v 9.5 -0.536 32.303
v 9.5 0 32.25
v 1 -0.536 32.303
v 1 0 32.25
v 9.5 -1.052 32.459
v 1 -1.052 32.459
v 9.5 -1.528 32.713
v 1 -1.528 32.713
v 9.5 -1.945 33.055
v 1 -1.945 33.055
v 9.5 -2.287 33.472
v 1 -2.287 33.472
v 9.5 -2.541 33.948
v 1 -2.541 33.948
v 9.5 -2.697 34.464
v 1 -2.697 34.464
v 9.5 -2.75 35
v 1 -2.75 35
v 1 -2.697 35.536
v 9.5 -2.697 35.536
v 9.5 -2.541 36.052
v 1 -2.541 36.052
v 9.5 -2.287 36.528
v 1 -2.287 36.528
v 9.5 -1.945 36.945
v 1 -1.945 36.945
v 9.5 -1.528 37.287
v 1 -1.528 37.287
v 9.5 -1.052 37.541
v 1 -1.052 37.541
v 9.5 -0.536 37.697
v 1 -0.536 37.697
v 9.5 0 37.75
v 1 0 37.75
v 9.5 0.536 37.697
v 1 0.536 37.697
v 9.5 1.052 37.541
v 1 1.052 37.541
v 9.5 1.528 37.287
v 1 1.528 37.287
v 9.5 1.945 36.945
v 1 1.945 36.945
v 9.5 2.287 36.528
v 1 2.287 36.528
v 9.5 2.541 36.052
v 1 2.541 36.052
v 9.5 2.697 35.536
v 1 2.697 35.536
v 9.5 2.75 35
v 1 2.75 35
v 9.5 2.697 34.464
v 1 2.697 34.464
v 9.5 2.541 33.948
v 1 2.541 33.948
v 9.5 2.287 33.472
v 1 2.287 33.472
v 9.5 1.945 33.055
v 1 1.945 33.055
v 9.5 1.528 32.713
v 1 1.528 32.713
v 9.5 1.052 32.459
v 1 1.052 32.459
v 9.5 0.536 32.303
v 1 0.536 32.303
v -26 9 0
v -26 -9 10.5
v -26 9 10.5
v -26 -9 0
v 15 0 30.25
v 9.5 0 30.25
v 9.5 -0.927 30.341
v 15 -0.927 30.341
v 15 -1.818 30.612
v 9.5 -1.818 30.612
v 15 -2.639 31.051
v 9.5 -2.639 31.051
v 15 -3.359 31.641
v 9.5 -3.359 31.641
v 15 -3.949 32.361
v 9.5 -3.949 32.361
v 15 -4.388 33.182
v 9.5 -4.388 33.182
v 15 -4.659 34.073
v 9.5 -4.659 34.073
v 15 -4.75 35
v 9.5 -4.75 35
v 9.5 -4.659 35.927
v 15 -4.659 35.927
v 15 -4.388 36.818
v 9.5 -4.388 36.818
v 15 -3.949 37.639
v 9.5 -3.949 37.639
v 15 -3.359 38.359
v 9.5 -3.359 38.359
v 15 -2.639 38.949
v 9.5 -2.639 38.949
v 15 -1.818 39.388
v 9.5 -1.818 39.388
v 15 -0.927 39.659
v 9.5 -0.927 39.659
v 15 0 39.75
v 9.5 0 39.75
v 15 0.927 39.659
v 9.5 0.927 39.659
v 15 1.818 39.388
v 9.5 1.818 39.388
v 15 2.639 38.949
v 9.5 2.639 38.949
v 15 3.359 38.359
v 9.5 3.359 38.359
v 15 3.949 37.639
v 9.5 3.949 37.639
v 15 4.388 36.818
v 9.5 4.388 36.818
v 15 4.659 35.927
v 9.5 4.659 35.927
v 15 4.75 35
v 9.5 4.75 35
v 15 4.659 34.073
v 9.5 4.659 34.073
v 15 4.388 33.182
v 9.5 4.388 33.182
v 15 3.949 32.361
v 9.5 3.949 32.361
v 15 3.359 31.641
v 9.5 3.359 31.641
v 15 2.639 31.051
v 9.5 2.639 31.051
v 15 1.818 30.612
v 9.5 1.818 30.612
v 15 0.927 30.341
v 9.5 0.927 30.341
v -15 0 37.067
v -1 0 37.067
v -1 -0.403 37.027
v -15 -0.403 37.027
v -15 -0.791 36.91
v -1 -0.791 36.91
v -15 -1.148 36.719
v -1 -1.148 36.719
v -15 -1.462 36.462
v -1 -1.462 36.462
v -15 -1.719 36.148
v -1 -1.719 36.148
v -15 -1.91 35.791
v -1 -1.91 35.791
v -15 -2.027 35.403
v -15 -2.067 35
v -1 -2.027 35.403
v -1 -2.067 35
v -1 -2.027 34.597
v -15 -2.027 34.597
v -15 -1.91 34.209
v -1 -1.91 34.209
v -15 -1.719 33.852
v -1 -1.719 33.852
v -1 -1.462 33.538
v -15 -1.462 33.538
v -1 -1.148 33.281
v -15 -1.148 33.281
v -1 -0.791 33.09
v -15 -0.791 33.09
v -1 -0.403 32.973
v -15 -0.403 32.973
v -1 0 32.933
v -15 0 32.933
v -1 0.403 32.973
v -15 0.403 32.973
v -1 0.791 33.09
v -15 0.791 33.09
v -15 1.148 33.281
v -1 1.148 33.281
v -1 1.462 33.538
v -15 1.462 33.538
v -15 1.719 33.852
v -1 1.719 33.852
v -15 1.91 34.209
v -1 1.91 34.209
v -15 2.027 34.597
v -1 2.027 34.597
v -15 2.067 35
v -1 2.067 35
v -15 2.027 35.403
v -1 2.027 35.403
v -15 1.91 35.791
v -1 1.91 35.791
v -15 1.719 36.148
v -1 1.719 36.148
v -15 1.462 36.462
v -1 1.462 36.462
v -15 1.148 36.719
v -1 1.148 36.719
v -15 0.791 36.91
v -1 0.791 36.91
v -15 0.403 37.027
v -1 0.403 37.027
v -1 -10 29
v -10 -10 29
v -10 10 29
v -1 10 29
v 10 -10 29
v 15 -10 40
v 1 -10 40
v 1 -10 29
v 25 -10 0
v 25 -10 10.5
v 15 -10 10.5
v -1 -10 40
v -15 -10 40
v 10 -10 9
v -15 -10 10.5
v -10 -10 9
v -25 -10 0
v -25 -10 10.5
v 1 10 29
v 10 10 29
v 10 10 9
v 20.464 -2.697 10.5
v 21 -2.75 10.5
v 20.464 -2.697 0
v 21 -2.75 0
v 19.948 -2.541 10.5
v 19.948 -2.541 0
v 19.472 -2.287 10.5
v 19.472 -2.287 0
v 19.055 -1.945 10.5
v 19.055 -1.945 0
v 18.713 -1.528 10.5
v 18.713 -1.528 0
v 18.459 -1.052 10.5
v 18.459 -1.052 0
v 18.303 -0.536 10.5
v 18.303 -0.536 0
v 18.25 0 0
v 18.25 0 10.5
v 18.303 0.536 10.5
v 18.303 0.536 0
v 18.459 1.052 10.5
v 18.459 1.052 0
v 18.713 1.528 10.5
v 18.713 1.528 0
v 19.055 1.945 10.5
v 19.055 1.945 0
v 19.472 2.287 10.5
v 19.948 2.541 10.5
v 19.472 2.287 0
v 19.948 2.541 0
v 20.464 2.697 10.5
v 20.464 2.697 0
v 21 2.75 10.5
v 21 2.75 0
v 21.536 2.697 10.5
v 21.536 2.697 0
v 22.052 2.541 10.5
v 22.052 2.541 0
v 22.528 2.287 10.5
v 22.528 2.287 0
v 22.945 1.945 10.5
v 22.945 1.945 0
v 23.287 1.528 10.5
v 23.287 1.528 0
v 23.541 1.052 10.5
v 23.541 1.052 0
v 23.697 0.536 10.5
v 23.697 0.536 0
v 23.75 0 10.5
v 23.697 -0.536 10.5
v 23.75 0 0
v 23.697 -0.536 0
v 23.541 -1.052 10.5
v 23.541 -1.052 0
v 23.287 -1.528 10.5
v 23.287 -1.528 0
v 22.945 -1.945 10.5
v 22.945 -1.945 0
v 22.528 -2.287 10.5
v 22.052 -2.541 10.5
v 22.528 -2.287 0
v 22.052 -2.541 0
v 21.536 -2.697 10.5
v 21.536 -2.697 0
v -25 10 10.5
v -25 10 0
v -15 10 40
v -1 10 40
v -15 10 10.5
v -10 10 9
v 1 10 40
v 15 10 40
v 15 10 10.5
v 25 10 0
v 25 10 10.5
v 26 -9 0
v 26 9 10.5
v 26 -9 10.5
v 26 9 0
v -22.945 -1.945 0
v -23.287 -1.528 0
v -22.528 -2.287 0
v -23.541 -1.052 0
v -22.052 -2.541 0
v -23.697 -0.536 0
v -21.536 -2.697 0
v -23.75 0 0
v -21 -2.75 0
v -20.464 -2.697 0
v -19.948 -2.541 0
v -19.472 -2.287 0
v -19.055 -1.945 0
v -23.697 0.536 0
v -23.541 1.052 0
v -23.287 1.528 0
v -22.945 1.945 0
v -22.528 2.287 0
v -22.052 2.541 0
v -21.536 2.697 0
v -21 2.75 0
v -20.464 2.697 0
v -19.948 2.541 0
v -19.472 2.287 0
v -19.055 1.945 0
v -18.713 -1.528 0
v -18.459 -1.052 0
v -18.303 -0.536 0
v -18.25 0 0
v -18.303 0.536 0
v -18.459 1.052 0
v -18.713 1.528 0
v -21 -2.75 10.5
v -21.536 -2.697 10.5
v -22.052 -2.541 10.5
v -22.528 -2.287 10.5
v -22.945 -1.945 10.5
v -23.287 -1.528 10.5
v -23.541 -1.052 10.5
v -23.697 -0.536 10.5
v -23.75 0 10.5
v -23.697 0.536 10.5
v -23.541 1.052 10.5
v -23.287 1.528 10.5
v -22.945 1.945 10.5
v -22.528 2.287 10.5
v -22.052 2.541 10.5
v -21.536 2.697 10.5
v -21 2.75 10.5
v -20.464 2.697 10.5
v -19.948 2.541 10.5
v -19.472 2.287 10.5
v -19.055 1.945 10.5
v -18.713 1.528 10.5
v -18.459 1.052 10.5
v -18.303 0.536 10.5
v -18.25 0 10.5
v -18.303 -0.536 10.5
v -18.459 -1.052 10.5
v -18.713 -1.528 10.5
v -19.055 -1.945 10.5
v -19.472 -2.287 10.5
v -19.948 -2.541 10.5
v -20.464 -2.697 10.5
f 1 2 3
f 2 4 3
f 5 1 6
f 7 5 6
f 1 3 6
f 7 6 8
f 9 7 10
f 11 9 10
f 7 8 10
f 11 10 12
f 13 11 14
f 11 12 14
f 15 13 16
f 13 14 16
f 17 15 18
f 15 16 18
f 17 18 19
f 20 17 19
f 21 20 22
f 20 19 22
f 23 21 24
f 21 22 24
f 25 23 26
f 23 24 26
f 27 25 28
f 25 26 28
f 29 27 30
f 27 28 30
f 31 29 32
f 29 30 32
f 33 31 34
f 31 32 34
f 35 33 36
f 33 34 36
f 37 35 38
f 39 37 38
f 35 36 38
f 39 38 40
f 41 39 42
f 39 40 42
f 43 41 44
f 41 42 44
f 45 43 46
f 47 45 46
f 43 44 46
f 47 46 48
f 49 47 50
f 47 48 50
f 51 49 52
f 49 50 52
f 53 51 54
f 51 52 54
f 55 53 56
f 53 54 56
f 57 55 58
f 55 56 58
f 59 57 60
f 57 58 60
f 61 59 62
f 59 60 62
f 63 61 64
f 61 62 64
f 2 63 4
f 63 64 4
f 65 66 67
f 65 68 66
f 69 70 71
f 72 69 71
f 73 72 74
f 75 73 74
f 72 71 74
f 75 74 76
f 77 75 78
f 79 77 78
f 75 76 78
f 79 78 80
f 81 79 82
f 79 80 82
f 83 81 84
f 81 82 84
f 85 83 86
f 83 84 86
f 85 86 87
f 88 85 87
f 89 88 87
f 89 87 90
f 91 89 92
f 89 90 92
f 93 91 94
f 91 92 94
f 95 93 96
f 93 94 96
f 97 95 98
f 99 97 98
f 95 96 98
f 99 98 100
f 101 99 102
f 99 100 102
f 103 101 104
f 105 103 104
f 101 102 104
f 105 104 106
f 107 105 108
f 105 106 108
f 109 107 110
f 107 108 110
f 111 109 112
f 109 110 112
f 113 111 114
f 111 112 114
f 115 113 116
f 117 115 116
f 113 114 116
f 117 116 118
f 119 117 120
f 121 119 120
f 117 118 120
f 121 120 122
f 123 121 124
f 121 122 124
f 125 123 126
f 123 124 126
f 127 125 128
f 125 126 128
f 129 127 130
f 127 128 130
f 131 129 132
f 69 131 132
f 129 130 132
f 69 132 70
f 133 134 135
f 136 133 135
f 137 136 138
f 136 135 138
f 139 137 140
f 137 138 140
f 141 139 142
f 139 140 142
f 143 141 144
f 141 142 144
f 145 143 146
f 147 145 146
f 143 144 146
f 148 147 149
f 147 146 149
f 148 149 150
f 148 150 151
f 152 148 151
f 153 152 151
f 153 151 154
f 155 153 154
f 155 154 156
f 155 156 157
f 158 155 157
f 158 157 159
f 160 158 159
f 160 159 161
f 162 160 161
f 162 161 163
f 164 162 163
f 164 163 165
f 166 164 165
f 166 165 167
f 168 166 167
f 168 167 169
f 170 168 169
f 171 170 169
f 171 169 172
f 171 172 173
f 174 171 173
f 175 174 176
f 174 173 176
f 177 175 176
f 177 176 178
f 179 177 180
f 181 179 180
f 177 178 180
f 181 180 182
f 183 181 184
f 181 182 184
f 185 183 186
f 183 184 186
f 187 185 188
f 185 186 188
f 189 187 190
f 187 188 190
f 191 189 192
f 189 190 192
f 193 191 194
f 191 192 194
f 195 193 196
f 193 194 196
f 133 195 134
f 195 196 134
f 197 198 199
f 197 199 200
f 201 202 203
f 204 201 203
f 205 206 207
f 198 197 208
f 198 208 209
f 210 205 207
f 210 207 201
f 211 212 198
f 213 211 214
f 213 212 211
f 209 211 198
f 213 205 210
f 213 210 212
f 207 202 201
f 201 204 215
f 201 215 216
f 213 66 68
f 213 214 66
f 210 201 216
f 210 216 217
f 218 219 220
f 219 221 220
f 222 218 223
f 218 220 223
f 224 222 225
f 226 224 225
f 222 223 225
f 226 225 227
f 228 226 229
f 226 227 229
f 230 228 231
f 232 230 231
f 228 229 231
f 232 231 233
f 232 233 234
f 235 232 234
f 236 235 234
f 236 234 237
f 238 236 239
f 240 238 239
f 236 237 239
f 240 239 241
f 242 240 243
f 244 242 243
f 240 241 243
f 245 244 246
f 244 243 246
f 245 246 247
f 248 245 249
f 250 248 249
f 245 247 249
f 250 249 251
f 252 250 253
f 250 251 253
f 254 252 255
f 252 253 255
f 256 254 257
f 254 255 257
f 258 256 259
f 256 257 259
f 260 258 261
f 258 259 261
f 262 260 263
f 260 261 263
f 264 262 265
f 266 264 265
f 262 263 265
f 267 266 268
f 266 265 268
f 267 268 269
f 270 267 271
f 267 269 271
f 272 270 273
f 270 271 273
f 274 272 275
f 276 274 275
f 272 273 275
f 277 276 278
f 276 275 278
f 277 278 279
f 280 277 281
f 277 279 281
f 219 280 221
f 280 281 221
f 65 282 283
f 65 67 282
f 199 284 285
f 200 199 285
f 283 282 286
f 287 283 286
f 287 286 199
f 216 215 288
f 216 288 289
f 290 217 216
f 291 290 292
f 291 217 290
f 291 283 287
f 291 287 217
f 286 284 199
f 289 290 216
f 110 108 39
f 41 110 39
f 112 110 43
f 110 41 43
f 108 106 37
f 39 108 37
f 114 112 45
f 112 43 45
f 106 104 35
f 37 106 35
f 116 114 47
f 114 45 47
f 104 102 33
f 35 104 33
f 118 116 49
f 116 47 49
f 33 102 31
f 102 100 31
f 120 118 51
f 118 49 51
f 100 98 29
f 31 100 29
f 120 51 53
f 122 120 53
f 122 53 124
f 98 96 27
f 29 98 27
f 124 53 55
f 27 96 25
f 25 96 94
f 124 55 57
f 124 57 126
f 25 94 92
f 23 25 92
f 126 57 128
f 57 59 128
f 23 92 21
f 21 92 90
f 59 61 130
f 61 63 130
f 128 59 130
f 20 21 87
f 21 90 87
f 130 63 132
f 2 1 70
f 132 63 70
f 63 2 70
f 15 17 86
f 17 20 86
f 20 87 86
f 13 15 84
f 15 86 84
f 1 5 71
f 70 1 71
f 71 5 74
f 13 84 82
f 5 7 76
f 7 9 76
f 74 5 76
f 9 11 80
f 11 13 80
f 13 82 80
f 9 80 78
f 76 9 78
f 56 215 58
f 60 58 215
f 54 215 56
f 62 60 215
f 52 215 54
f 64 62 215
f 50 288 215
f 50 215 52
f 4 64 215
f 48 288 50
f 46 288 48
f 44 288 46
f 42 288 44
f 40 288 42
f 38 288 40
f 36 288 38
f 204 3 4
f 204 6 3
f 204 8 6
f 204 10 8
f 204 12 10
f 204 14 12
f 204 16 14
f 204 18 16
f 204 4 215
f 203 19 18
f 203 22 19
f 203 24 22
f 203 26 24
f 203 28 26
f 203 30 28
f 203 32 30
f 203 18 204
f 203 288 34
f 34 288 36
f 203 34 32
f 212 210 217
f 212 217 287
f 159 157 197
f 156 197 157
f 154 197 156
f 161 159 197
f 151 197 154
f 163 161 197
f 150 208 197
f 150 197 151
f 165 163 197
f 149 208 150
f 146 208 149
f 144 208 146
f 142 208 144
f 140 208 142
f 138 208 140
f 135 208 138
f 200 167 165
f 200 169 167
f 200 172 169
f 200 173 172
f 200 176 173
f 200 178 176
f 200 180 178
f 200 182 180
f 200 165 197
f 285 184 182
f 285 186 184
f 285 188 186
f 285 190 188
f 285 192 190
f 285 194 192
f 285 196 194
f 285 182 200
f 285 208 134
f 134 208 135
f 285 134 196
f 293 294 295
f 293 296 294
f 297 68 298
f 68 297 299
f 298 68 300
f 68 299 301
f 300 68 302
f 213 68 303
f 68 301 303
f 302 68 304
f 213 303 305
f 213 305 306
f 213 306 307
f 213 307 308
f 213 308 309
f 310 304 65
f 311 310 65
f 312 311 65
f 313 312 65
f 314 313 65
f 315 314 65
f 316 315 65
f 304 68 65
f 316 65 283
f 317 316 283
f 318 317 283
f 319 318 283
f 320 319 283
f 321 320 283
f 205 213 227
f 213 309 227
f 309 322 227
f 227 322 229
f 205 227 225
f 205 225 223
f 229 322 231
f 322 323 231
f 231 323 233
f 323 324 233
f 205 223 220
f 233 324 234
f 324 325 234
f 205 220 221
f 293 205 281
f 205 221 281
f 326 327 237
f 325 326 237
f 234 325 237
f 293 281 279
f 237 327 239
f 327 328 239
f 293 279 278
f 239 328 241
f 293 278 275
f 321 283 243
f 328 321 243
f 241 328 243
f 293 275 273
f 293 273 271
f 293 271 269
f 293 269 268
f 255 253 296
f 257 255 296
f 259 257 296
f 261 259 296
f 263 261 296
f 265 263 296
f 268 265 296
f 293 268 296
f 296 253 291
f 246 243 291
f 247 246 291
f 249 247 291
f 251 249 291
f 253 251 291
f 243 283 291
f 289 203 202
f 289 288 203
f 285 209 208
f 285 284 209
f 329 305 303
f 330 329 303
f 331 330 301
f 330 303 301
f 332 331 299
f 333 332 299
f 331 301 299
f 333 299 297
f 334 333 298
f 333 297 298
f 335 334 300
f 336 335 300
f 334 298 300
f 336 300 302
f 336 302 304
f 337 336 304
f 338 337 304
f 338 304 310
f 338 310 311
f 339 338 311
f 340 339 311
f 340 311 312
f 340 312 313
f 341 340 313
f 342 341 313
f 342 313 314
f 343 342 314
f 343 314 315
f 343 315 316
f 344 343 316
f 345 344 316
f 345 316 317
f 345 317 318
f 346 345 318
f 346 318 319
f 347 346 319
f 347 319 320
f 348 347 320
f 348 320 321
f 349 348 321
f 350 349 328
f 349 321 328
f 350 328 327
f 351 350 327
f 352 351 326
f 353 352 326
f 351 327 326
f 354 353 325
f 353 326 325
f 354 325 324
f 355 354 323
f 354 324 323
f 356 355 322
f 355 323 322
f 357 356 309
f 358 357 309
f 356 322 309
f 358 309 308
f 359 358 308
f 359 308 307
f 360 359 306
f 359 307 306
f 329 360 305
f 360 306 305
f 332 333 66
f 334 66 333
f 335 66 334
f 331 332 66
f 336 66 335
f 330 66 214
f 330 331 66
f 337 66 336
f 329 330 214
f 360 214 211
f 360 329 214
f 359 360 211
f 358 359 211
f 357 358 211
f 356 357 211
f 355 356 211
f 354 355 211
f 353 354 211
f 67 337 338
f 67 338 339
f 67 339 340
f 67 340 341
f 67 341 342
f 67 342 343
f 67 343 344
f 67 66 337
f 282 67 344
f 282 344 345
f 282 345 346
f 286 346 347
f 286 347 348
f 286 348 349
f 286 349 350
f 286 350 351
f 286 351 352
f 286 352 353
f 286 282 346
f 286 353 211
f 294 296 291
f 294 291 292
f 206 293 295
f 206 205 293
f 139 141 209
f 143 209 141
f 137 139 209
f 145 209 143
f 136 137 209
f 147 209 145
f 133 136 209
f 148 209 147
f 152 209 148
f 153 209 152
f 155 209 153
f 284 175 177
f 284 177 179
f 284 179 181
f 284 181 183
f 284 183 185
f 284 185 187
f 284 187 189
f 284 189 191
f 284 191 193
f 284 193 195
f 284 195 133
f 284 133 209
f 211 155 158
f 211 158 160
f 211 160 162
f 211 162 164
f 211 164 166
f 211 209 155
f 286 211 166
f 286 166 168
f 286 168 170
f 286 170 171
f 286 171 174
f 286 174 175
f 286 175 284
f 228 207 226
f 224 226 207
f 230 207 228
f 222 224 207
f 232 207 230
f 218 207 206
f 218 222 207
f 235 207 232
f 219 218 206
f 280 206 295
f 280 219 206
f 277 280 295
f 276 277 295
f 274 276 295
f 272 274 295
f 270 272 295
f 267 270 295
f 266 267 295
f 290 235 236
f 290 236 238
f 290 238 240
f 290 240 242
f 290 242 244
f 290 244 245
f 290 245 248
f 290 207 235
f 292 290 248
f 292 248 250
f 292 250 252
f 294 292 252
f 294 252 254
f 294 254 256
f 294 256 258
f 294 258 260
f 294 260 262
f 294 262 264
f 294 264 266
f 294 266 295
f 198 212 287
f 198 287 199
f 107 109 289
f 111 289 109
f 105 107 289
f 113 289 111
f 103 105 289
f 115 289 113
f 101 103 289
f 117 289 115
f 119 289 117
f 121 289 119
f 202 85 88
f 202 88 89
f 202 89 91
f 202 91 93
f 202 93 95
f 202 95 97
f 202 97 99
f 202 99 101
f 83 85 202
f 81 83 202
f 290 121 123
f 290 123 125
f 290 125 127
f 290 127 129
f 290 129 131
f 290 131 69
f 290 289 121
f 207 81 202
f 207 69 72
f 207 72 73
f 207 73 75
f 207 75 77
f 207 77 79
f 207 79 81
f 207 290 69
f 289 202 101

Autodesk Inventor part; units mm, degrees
ref_plane "YZ Plane" through (0, 0, 0) normal (1, 0, 0) x (0, 1, 0)
ref_plane "XZ Plane" through (0, 0, 0) normal (0, 1, 0) x (-1, 0, 0)
ref_plane "XY Plane" through (0, 0, 0) normal (0, 0, 1) x (1, 0, 0)
sketch "スケッチ1" plane through (0, 0, 0) normal (0, 0, 1) x (1, 0, 0)
  line L0 (-26, 10) -> (26, 10)
  line L1 (26, 10) -> (26, -10)
  line L2 (26, -10) -> (-26, -10)
  line L3 (-26, -10) -> (-26, 10)
  point P0 (0, 0)
  point P1 (0, -10)
  point P2 (-26, 0)
  dimension "d0" = 52
  dimension "d1" = 20
extrude "押し出し1" add sketch "スケッチ1" along normal blind 10.5
sketch "スケッチ2" plane through (0, 0, 10.5) normal (0, 0, 1) x (1, 0, 0)
  line L0 (-26, 10) -> (26, 10) projected
  line L1 (26, -10) -> (-26, -10) projected
  line L2 (-15, 10) -> (15, 10)
  line L3 (15, 10) -> (15, -10)
  line L4 (15, -10) -> (-15, -10)
  line L5 (-15, -10) -> (-15, 10)
  point P0 (0, 0)
  point P1 (0, -10)
  dimension "d4" = 30
extrude "押し出し2" add sketch "スケッチ2" along normal blind 29.5
sketch "スケッチ4" plane through (-26, -10, 0) normal (0, -1, 0) x (1, 0, 0)
  line L0 (52, 0) -> (0, 0) projected
  line L1 (16, 29) -> (36, 29)
  line L2 (36, 29) -> (36, 9)
  line L3 (36, 9) -> (16, 9)
  line L4 (16, 9) -> (16, 29)
  point P0 (26, 0)
  point P1 (26, 9)
  point P2 (26, 0)
  dimension "d8" = 20
  dimension "d9" = 20
  dimension "d10" = 9
extrude "押し出し3" cut sketch "スケッチ4" against normal through all
sketch "スケッチ5" plane through (0, 0, 40) normal (0, 0, 1) x (1, 0, 0)
  line L0 (-15, 10) -> (15, 10) projected
  line L1 (15, -10) -> (-15, -10) projected
  line L2 (-1, 10) -> (1, 10)
  line L3 (1, 10) -> (1, -10)
  line L4 (1, -10) -> (-1, -10)
  line L5 (-1, -10) -> (-1, 10)
  point P0 (0, 0)
  point P1 (0, -10)
  dimension "d13" = 2
extrude "押し出し4" cut sketch "スケッチ5" against normal up to surface (11 mm away)
sketch "スケッチ6" plane through (0, 0, 10.5) normal (0, 0, 1) x (1, 0, 0)
  line L0 (-26, -10) -> (-26, 10) projected
  line L1 (26, 10) -> (26, -10) projected
  point P0 (0, 0)
  point P1 (-21, 0)
  point P2 (21, 0)
  point P3 (-26, 0)
  dimension "d16" = 5
  dimension "d17" = 5
hole "穴1" at (-21, 0, 10.5) at (21, 0, 10.5) direction (0, 0, -1) diameter 5.5 end through all
sketch "スケッチ7" plane through (15, -10, 10.5) normal (1, 0, 0) x (0, 0, -1)
  line L0 (-29.5, 20) -> (-29.5, 0) projected
  line L1 (10.5, 12.75) -> (10.5, 7.25) projected
  point P0 (10.5, 10)
  point P1 (-24.5, 10)
  point P2 (-29.5, 10)
  dimension "d25" = 35
hole "穴2" at (15, 0, 35) direction (-1, 0, 0) diameter 5.5 end up to surface counterbore diameter 9.5 counterbore depth 5.5
sketch "スケッチ8" plane through (-15, -10, 10.5) normal (-1, 0, 0) x (0, 0, 1)
  circle A0 centre (24.5, 10) radius 2.75 projected
  point P0 (-10.5, 10)
hole "穴3" at (-15, 0, 35) direction (1, 0, 0) diameter 4.134 end up to surface thread size "M5x0.8" class "6H" standard "ANSI Metric M Profile"
chamfer "面取り1" distance 1 angle 45 4 edges at (-26, 10, 5.25) (26, 10, 5.25) (26, -10, 5.25) (-26, -10, 5.25)
equation "\"d9\" = d8"
equation "\"d17\" = d16"
properties part number "CLTQAM20" material "MISUMI"
